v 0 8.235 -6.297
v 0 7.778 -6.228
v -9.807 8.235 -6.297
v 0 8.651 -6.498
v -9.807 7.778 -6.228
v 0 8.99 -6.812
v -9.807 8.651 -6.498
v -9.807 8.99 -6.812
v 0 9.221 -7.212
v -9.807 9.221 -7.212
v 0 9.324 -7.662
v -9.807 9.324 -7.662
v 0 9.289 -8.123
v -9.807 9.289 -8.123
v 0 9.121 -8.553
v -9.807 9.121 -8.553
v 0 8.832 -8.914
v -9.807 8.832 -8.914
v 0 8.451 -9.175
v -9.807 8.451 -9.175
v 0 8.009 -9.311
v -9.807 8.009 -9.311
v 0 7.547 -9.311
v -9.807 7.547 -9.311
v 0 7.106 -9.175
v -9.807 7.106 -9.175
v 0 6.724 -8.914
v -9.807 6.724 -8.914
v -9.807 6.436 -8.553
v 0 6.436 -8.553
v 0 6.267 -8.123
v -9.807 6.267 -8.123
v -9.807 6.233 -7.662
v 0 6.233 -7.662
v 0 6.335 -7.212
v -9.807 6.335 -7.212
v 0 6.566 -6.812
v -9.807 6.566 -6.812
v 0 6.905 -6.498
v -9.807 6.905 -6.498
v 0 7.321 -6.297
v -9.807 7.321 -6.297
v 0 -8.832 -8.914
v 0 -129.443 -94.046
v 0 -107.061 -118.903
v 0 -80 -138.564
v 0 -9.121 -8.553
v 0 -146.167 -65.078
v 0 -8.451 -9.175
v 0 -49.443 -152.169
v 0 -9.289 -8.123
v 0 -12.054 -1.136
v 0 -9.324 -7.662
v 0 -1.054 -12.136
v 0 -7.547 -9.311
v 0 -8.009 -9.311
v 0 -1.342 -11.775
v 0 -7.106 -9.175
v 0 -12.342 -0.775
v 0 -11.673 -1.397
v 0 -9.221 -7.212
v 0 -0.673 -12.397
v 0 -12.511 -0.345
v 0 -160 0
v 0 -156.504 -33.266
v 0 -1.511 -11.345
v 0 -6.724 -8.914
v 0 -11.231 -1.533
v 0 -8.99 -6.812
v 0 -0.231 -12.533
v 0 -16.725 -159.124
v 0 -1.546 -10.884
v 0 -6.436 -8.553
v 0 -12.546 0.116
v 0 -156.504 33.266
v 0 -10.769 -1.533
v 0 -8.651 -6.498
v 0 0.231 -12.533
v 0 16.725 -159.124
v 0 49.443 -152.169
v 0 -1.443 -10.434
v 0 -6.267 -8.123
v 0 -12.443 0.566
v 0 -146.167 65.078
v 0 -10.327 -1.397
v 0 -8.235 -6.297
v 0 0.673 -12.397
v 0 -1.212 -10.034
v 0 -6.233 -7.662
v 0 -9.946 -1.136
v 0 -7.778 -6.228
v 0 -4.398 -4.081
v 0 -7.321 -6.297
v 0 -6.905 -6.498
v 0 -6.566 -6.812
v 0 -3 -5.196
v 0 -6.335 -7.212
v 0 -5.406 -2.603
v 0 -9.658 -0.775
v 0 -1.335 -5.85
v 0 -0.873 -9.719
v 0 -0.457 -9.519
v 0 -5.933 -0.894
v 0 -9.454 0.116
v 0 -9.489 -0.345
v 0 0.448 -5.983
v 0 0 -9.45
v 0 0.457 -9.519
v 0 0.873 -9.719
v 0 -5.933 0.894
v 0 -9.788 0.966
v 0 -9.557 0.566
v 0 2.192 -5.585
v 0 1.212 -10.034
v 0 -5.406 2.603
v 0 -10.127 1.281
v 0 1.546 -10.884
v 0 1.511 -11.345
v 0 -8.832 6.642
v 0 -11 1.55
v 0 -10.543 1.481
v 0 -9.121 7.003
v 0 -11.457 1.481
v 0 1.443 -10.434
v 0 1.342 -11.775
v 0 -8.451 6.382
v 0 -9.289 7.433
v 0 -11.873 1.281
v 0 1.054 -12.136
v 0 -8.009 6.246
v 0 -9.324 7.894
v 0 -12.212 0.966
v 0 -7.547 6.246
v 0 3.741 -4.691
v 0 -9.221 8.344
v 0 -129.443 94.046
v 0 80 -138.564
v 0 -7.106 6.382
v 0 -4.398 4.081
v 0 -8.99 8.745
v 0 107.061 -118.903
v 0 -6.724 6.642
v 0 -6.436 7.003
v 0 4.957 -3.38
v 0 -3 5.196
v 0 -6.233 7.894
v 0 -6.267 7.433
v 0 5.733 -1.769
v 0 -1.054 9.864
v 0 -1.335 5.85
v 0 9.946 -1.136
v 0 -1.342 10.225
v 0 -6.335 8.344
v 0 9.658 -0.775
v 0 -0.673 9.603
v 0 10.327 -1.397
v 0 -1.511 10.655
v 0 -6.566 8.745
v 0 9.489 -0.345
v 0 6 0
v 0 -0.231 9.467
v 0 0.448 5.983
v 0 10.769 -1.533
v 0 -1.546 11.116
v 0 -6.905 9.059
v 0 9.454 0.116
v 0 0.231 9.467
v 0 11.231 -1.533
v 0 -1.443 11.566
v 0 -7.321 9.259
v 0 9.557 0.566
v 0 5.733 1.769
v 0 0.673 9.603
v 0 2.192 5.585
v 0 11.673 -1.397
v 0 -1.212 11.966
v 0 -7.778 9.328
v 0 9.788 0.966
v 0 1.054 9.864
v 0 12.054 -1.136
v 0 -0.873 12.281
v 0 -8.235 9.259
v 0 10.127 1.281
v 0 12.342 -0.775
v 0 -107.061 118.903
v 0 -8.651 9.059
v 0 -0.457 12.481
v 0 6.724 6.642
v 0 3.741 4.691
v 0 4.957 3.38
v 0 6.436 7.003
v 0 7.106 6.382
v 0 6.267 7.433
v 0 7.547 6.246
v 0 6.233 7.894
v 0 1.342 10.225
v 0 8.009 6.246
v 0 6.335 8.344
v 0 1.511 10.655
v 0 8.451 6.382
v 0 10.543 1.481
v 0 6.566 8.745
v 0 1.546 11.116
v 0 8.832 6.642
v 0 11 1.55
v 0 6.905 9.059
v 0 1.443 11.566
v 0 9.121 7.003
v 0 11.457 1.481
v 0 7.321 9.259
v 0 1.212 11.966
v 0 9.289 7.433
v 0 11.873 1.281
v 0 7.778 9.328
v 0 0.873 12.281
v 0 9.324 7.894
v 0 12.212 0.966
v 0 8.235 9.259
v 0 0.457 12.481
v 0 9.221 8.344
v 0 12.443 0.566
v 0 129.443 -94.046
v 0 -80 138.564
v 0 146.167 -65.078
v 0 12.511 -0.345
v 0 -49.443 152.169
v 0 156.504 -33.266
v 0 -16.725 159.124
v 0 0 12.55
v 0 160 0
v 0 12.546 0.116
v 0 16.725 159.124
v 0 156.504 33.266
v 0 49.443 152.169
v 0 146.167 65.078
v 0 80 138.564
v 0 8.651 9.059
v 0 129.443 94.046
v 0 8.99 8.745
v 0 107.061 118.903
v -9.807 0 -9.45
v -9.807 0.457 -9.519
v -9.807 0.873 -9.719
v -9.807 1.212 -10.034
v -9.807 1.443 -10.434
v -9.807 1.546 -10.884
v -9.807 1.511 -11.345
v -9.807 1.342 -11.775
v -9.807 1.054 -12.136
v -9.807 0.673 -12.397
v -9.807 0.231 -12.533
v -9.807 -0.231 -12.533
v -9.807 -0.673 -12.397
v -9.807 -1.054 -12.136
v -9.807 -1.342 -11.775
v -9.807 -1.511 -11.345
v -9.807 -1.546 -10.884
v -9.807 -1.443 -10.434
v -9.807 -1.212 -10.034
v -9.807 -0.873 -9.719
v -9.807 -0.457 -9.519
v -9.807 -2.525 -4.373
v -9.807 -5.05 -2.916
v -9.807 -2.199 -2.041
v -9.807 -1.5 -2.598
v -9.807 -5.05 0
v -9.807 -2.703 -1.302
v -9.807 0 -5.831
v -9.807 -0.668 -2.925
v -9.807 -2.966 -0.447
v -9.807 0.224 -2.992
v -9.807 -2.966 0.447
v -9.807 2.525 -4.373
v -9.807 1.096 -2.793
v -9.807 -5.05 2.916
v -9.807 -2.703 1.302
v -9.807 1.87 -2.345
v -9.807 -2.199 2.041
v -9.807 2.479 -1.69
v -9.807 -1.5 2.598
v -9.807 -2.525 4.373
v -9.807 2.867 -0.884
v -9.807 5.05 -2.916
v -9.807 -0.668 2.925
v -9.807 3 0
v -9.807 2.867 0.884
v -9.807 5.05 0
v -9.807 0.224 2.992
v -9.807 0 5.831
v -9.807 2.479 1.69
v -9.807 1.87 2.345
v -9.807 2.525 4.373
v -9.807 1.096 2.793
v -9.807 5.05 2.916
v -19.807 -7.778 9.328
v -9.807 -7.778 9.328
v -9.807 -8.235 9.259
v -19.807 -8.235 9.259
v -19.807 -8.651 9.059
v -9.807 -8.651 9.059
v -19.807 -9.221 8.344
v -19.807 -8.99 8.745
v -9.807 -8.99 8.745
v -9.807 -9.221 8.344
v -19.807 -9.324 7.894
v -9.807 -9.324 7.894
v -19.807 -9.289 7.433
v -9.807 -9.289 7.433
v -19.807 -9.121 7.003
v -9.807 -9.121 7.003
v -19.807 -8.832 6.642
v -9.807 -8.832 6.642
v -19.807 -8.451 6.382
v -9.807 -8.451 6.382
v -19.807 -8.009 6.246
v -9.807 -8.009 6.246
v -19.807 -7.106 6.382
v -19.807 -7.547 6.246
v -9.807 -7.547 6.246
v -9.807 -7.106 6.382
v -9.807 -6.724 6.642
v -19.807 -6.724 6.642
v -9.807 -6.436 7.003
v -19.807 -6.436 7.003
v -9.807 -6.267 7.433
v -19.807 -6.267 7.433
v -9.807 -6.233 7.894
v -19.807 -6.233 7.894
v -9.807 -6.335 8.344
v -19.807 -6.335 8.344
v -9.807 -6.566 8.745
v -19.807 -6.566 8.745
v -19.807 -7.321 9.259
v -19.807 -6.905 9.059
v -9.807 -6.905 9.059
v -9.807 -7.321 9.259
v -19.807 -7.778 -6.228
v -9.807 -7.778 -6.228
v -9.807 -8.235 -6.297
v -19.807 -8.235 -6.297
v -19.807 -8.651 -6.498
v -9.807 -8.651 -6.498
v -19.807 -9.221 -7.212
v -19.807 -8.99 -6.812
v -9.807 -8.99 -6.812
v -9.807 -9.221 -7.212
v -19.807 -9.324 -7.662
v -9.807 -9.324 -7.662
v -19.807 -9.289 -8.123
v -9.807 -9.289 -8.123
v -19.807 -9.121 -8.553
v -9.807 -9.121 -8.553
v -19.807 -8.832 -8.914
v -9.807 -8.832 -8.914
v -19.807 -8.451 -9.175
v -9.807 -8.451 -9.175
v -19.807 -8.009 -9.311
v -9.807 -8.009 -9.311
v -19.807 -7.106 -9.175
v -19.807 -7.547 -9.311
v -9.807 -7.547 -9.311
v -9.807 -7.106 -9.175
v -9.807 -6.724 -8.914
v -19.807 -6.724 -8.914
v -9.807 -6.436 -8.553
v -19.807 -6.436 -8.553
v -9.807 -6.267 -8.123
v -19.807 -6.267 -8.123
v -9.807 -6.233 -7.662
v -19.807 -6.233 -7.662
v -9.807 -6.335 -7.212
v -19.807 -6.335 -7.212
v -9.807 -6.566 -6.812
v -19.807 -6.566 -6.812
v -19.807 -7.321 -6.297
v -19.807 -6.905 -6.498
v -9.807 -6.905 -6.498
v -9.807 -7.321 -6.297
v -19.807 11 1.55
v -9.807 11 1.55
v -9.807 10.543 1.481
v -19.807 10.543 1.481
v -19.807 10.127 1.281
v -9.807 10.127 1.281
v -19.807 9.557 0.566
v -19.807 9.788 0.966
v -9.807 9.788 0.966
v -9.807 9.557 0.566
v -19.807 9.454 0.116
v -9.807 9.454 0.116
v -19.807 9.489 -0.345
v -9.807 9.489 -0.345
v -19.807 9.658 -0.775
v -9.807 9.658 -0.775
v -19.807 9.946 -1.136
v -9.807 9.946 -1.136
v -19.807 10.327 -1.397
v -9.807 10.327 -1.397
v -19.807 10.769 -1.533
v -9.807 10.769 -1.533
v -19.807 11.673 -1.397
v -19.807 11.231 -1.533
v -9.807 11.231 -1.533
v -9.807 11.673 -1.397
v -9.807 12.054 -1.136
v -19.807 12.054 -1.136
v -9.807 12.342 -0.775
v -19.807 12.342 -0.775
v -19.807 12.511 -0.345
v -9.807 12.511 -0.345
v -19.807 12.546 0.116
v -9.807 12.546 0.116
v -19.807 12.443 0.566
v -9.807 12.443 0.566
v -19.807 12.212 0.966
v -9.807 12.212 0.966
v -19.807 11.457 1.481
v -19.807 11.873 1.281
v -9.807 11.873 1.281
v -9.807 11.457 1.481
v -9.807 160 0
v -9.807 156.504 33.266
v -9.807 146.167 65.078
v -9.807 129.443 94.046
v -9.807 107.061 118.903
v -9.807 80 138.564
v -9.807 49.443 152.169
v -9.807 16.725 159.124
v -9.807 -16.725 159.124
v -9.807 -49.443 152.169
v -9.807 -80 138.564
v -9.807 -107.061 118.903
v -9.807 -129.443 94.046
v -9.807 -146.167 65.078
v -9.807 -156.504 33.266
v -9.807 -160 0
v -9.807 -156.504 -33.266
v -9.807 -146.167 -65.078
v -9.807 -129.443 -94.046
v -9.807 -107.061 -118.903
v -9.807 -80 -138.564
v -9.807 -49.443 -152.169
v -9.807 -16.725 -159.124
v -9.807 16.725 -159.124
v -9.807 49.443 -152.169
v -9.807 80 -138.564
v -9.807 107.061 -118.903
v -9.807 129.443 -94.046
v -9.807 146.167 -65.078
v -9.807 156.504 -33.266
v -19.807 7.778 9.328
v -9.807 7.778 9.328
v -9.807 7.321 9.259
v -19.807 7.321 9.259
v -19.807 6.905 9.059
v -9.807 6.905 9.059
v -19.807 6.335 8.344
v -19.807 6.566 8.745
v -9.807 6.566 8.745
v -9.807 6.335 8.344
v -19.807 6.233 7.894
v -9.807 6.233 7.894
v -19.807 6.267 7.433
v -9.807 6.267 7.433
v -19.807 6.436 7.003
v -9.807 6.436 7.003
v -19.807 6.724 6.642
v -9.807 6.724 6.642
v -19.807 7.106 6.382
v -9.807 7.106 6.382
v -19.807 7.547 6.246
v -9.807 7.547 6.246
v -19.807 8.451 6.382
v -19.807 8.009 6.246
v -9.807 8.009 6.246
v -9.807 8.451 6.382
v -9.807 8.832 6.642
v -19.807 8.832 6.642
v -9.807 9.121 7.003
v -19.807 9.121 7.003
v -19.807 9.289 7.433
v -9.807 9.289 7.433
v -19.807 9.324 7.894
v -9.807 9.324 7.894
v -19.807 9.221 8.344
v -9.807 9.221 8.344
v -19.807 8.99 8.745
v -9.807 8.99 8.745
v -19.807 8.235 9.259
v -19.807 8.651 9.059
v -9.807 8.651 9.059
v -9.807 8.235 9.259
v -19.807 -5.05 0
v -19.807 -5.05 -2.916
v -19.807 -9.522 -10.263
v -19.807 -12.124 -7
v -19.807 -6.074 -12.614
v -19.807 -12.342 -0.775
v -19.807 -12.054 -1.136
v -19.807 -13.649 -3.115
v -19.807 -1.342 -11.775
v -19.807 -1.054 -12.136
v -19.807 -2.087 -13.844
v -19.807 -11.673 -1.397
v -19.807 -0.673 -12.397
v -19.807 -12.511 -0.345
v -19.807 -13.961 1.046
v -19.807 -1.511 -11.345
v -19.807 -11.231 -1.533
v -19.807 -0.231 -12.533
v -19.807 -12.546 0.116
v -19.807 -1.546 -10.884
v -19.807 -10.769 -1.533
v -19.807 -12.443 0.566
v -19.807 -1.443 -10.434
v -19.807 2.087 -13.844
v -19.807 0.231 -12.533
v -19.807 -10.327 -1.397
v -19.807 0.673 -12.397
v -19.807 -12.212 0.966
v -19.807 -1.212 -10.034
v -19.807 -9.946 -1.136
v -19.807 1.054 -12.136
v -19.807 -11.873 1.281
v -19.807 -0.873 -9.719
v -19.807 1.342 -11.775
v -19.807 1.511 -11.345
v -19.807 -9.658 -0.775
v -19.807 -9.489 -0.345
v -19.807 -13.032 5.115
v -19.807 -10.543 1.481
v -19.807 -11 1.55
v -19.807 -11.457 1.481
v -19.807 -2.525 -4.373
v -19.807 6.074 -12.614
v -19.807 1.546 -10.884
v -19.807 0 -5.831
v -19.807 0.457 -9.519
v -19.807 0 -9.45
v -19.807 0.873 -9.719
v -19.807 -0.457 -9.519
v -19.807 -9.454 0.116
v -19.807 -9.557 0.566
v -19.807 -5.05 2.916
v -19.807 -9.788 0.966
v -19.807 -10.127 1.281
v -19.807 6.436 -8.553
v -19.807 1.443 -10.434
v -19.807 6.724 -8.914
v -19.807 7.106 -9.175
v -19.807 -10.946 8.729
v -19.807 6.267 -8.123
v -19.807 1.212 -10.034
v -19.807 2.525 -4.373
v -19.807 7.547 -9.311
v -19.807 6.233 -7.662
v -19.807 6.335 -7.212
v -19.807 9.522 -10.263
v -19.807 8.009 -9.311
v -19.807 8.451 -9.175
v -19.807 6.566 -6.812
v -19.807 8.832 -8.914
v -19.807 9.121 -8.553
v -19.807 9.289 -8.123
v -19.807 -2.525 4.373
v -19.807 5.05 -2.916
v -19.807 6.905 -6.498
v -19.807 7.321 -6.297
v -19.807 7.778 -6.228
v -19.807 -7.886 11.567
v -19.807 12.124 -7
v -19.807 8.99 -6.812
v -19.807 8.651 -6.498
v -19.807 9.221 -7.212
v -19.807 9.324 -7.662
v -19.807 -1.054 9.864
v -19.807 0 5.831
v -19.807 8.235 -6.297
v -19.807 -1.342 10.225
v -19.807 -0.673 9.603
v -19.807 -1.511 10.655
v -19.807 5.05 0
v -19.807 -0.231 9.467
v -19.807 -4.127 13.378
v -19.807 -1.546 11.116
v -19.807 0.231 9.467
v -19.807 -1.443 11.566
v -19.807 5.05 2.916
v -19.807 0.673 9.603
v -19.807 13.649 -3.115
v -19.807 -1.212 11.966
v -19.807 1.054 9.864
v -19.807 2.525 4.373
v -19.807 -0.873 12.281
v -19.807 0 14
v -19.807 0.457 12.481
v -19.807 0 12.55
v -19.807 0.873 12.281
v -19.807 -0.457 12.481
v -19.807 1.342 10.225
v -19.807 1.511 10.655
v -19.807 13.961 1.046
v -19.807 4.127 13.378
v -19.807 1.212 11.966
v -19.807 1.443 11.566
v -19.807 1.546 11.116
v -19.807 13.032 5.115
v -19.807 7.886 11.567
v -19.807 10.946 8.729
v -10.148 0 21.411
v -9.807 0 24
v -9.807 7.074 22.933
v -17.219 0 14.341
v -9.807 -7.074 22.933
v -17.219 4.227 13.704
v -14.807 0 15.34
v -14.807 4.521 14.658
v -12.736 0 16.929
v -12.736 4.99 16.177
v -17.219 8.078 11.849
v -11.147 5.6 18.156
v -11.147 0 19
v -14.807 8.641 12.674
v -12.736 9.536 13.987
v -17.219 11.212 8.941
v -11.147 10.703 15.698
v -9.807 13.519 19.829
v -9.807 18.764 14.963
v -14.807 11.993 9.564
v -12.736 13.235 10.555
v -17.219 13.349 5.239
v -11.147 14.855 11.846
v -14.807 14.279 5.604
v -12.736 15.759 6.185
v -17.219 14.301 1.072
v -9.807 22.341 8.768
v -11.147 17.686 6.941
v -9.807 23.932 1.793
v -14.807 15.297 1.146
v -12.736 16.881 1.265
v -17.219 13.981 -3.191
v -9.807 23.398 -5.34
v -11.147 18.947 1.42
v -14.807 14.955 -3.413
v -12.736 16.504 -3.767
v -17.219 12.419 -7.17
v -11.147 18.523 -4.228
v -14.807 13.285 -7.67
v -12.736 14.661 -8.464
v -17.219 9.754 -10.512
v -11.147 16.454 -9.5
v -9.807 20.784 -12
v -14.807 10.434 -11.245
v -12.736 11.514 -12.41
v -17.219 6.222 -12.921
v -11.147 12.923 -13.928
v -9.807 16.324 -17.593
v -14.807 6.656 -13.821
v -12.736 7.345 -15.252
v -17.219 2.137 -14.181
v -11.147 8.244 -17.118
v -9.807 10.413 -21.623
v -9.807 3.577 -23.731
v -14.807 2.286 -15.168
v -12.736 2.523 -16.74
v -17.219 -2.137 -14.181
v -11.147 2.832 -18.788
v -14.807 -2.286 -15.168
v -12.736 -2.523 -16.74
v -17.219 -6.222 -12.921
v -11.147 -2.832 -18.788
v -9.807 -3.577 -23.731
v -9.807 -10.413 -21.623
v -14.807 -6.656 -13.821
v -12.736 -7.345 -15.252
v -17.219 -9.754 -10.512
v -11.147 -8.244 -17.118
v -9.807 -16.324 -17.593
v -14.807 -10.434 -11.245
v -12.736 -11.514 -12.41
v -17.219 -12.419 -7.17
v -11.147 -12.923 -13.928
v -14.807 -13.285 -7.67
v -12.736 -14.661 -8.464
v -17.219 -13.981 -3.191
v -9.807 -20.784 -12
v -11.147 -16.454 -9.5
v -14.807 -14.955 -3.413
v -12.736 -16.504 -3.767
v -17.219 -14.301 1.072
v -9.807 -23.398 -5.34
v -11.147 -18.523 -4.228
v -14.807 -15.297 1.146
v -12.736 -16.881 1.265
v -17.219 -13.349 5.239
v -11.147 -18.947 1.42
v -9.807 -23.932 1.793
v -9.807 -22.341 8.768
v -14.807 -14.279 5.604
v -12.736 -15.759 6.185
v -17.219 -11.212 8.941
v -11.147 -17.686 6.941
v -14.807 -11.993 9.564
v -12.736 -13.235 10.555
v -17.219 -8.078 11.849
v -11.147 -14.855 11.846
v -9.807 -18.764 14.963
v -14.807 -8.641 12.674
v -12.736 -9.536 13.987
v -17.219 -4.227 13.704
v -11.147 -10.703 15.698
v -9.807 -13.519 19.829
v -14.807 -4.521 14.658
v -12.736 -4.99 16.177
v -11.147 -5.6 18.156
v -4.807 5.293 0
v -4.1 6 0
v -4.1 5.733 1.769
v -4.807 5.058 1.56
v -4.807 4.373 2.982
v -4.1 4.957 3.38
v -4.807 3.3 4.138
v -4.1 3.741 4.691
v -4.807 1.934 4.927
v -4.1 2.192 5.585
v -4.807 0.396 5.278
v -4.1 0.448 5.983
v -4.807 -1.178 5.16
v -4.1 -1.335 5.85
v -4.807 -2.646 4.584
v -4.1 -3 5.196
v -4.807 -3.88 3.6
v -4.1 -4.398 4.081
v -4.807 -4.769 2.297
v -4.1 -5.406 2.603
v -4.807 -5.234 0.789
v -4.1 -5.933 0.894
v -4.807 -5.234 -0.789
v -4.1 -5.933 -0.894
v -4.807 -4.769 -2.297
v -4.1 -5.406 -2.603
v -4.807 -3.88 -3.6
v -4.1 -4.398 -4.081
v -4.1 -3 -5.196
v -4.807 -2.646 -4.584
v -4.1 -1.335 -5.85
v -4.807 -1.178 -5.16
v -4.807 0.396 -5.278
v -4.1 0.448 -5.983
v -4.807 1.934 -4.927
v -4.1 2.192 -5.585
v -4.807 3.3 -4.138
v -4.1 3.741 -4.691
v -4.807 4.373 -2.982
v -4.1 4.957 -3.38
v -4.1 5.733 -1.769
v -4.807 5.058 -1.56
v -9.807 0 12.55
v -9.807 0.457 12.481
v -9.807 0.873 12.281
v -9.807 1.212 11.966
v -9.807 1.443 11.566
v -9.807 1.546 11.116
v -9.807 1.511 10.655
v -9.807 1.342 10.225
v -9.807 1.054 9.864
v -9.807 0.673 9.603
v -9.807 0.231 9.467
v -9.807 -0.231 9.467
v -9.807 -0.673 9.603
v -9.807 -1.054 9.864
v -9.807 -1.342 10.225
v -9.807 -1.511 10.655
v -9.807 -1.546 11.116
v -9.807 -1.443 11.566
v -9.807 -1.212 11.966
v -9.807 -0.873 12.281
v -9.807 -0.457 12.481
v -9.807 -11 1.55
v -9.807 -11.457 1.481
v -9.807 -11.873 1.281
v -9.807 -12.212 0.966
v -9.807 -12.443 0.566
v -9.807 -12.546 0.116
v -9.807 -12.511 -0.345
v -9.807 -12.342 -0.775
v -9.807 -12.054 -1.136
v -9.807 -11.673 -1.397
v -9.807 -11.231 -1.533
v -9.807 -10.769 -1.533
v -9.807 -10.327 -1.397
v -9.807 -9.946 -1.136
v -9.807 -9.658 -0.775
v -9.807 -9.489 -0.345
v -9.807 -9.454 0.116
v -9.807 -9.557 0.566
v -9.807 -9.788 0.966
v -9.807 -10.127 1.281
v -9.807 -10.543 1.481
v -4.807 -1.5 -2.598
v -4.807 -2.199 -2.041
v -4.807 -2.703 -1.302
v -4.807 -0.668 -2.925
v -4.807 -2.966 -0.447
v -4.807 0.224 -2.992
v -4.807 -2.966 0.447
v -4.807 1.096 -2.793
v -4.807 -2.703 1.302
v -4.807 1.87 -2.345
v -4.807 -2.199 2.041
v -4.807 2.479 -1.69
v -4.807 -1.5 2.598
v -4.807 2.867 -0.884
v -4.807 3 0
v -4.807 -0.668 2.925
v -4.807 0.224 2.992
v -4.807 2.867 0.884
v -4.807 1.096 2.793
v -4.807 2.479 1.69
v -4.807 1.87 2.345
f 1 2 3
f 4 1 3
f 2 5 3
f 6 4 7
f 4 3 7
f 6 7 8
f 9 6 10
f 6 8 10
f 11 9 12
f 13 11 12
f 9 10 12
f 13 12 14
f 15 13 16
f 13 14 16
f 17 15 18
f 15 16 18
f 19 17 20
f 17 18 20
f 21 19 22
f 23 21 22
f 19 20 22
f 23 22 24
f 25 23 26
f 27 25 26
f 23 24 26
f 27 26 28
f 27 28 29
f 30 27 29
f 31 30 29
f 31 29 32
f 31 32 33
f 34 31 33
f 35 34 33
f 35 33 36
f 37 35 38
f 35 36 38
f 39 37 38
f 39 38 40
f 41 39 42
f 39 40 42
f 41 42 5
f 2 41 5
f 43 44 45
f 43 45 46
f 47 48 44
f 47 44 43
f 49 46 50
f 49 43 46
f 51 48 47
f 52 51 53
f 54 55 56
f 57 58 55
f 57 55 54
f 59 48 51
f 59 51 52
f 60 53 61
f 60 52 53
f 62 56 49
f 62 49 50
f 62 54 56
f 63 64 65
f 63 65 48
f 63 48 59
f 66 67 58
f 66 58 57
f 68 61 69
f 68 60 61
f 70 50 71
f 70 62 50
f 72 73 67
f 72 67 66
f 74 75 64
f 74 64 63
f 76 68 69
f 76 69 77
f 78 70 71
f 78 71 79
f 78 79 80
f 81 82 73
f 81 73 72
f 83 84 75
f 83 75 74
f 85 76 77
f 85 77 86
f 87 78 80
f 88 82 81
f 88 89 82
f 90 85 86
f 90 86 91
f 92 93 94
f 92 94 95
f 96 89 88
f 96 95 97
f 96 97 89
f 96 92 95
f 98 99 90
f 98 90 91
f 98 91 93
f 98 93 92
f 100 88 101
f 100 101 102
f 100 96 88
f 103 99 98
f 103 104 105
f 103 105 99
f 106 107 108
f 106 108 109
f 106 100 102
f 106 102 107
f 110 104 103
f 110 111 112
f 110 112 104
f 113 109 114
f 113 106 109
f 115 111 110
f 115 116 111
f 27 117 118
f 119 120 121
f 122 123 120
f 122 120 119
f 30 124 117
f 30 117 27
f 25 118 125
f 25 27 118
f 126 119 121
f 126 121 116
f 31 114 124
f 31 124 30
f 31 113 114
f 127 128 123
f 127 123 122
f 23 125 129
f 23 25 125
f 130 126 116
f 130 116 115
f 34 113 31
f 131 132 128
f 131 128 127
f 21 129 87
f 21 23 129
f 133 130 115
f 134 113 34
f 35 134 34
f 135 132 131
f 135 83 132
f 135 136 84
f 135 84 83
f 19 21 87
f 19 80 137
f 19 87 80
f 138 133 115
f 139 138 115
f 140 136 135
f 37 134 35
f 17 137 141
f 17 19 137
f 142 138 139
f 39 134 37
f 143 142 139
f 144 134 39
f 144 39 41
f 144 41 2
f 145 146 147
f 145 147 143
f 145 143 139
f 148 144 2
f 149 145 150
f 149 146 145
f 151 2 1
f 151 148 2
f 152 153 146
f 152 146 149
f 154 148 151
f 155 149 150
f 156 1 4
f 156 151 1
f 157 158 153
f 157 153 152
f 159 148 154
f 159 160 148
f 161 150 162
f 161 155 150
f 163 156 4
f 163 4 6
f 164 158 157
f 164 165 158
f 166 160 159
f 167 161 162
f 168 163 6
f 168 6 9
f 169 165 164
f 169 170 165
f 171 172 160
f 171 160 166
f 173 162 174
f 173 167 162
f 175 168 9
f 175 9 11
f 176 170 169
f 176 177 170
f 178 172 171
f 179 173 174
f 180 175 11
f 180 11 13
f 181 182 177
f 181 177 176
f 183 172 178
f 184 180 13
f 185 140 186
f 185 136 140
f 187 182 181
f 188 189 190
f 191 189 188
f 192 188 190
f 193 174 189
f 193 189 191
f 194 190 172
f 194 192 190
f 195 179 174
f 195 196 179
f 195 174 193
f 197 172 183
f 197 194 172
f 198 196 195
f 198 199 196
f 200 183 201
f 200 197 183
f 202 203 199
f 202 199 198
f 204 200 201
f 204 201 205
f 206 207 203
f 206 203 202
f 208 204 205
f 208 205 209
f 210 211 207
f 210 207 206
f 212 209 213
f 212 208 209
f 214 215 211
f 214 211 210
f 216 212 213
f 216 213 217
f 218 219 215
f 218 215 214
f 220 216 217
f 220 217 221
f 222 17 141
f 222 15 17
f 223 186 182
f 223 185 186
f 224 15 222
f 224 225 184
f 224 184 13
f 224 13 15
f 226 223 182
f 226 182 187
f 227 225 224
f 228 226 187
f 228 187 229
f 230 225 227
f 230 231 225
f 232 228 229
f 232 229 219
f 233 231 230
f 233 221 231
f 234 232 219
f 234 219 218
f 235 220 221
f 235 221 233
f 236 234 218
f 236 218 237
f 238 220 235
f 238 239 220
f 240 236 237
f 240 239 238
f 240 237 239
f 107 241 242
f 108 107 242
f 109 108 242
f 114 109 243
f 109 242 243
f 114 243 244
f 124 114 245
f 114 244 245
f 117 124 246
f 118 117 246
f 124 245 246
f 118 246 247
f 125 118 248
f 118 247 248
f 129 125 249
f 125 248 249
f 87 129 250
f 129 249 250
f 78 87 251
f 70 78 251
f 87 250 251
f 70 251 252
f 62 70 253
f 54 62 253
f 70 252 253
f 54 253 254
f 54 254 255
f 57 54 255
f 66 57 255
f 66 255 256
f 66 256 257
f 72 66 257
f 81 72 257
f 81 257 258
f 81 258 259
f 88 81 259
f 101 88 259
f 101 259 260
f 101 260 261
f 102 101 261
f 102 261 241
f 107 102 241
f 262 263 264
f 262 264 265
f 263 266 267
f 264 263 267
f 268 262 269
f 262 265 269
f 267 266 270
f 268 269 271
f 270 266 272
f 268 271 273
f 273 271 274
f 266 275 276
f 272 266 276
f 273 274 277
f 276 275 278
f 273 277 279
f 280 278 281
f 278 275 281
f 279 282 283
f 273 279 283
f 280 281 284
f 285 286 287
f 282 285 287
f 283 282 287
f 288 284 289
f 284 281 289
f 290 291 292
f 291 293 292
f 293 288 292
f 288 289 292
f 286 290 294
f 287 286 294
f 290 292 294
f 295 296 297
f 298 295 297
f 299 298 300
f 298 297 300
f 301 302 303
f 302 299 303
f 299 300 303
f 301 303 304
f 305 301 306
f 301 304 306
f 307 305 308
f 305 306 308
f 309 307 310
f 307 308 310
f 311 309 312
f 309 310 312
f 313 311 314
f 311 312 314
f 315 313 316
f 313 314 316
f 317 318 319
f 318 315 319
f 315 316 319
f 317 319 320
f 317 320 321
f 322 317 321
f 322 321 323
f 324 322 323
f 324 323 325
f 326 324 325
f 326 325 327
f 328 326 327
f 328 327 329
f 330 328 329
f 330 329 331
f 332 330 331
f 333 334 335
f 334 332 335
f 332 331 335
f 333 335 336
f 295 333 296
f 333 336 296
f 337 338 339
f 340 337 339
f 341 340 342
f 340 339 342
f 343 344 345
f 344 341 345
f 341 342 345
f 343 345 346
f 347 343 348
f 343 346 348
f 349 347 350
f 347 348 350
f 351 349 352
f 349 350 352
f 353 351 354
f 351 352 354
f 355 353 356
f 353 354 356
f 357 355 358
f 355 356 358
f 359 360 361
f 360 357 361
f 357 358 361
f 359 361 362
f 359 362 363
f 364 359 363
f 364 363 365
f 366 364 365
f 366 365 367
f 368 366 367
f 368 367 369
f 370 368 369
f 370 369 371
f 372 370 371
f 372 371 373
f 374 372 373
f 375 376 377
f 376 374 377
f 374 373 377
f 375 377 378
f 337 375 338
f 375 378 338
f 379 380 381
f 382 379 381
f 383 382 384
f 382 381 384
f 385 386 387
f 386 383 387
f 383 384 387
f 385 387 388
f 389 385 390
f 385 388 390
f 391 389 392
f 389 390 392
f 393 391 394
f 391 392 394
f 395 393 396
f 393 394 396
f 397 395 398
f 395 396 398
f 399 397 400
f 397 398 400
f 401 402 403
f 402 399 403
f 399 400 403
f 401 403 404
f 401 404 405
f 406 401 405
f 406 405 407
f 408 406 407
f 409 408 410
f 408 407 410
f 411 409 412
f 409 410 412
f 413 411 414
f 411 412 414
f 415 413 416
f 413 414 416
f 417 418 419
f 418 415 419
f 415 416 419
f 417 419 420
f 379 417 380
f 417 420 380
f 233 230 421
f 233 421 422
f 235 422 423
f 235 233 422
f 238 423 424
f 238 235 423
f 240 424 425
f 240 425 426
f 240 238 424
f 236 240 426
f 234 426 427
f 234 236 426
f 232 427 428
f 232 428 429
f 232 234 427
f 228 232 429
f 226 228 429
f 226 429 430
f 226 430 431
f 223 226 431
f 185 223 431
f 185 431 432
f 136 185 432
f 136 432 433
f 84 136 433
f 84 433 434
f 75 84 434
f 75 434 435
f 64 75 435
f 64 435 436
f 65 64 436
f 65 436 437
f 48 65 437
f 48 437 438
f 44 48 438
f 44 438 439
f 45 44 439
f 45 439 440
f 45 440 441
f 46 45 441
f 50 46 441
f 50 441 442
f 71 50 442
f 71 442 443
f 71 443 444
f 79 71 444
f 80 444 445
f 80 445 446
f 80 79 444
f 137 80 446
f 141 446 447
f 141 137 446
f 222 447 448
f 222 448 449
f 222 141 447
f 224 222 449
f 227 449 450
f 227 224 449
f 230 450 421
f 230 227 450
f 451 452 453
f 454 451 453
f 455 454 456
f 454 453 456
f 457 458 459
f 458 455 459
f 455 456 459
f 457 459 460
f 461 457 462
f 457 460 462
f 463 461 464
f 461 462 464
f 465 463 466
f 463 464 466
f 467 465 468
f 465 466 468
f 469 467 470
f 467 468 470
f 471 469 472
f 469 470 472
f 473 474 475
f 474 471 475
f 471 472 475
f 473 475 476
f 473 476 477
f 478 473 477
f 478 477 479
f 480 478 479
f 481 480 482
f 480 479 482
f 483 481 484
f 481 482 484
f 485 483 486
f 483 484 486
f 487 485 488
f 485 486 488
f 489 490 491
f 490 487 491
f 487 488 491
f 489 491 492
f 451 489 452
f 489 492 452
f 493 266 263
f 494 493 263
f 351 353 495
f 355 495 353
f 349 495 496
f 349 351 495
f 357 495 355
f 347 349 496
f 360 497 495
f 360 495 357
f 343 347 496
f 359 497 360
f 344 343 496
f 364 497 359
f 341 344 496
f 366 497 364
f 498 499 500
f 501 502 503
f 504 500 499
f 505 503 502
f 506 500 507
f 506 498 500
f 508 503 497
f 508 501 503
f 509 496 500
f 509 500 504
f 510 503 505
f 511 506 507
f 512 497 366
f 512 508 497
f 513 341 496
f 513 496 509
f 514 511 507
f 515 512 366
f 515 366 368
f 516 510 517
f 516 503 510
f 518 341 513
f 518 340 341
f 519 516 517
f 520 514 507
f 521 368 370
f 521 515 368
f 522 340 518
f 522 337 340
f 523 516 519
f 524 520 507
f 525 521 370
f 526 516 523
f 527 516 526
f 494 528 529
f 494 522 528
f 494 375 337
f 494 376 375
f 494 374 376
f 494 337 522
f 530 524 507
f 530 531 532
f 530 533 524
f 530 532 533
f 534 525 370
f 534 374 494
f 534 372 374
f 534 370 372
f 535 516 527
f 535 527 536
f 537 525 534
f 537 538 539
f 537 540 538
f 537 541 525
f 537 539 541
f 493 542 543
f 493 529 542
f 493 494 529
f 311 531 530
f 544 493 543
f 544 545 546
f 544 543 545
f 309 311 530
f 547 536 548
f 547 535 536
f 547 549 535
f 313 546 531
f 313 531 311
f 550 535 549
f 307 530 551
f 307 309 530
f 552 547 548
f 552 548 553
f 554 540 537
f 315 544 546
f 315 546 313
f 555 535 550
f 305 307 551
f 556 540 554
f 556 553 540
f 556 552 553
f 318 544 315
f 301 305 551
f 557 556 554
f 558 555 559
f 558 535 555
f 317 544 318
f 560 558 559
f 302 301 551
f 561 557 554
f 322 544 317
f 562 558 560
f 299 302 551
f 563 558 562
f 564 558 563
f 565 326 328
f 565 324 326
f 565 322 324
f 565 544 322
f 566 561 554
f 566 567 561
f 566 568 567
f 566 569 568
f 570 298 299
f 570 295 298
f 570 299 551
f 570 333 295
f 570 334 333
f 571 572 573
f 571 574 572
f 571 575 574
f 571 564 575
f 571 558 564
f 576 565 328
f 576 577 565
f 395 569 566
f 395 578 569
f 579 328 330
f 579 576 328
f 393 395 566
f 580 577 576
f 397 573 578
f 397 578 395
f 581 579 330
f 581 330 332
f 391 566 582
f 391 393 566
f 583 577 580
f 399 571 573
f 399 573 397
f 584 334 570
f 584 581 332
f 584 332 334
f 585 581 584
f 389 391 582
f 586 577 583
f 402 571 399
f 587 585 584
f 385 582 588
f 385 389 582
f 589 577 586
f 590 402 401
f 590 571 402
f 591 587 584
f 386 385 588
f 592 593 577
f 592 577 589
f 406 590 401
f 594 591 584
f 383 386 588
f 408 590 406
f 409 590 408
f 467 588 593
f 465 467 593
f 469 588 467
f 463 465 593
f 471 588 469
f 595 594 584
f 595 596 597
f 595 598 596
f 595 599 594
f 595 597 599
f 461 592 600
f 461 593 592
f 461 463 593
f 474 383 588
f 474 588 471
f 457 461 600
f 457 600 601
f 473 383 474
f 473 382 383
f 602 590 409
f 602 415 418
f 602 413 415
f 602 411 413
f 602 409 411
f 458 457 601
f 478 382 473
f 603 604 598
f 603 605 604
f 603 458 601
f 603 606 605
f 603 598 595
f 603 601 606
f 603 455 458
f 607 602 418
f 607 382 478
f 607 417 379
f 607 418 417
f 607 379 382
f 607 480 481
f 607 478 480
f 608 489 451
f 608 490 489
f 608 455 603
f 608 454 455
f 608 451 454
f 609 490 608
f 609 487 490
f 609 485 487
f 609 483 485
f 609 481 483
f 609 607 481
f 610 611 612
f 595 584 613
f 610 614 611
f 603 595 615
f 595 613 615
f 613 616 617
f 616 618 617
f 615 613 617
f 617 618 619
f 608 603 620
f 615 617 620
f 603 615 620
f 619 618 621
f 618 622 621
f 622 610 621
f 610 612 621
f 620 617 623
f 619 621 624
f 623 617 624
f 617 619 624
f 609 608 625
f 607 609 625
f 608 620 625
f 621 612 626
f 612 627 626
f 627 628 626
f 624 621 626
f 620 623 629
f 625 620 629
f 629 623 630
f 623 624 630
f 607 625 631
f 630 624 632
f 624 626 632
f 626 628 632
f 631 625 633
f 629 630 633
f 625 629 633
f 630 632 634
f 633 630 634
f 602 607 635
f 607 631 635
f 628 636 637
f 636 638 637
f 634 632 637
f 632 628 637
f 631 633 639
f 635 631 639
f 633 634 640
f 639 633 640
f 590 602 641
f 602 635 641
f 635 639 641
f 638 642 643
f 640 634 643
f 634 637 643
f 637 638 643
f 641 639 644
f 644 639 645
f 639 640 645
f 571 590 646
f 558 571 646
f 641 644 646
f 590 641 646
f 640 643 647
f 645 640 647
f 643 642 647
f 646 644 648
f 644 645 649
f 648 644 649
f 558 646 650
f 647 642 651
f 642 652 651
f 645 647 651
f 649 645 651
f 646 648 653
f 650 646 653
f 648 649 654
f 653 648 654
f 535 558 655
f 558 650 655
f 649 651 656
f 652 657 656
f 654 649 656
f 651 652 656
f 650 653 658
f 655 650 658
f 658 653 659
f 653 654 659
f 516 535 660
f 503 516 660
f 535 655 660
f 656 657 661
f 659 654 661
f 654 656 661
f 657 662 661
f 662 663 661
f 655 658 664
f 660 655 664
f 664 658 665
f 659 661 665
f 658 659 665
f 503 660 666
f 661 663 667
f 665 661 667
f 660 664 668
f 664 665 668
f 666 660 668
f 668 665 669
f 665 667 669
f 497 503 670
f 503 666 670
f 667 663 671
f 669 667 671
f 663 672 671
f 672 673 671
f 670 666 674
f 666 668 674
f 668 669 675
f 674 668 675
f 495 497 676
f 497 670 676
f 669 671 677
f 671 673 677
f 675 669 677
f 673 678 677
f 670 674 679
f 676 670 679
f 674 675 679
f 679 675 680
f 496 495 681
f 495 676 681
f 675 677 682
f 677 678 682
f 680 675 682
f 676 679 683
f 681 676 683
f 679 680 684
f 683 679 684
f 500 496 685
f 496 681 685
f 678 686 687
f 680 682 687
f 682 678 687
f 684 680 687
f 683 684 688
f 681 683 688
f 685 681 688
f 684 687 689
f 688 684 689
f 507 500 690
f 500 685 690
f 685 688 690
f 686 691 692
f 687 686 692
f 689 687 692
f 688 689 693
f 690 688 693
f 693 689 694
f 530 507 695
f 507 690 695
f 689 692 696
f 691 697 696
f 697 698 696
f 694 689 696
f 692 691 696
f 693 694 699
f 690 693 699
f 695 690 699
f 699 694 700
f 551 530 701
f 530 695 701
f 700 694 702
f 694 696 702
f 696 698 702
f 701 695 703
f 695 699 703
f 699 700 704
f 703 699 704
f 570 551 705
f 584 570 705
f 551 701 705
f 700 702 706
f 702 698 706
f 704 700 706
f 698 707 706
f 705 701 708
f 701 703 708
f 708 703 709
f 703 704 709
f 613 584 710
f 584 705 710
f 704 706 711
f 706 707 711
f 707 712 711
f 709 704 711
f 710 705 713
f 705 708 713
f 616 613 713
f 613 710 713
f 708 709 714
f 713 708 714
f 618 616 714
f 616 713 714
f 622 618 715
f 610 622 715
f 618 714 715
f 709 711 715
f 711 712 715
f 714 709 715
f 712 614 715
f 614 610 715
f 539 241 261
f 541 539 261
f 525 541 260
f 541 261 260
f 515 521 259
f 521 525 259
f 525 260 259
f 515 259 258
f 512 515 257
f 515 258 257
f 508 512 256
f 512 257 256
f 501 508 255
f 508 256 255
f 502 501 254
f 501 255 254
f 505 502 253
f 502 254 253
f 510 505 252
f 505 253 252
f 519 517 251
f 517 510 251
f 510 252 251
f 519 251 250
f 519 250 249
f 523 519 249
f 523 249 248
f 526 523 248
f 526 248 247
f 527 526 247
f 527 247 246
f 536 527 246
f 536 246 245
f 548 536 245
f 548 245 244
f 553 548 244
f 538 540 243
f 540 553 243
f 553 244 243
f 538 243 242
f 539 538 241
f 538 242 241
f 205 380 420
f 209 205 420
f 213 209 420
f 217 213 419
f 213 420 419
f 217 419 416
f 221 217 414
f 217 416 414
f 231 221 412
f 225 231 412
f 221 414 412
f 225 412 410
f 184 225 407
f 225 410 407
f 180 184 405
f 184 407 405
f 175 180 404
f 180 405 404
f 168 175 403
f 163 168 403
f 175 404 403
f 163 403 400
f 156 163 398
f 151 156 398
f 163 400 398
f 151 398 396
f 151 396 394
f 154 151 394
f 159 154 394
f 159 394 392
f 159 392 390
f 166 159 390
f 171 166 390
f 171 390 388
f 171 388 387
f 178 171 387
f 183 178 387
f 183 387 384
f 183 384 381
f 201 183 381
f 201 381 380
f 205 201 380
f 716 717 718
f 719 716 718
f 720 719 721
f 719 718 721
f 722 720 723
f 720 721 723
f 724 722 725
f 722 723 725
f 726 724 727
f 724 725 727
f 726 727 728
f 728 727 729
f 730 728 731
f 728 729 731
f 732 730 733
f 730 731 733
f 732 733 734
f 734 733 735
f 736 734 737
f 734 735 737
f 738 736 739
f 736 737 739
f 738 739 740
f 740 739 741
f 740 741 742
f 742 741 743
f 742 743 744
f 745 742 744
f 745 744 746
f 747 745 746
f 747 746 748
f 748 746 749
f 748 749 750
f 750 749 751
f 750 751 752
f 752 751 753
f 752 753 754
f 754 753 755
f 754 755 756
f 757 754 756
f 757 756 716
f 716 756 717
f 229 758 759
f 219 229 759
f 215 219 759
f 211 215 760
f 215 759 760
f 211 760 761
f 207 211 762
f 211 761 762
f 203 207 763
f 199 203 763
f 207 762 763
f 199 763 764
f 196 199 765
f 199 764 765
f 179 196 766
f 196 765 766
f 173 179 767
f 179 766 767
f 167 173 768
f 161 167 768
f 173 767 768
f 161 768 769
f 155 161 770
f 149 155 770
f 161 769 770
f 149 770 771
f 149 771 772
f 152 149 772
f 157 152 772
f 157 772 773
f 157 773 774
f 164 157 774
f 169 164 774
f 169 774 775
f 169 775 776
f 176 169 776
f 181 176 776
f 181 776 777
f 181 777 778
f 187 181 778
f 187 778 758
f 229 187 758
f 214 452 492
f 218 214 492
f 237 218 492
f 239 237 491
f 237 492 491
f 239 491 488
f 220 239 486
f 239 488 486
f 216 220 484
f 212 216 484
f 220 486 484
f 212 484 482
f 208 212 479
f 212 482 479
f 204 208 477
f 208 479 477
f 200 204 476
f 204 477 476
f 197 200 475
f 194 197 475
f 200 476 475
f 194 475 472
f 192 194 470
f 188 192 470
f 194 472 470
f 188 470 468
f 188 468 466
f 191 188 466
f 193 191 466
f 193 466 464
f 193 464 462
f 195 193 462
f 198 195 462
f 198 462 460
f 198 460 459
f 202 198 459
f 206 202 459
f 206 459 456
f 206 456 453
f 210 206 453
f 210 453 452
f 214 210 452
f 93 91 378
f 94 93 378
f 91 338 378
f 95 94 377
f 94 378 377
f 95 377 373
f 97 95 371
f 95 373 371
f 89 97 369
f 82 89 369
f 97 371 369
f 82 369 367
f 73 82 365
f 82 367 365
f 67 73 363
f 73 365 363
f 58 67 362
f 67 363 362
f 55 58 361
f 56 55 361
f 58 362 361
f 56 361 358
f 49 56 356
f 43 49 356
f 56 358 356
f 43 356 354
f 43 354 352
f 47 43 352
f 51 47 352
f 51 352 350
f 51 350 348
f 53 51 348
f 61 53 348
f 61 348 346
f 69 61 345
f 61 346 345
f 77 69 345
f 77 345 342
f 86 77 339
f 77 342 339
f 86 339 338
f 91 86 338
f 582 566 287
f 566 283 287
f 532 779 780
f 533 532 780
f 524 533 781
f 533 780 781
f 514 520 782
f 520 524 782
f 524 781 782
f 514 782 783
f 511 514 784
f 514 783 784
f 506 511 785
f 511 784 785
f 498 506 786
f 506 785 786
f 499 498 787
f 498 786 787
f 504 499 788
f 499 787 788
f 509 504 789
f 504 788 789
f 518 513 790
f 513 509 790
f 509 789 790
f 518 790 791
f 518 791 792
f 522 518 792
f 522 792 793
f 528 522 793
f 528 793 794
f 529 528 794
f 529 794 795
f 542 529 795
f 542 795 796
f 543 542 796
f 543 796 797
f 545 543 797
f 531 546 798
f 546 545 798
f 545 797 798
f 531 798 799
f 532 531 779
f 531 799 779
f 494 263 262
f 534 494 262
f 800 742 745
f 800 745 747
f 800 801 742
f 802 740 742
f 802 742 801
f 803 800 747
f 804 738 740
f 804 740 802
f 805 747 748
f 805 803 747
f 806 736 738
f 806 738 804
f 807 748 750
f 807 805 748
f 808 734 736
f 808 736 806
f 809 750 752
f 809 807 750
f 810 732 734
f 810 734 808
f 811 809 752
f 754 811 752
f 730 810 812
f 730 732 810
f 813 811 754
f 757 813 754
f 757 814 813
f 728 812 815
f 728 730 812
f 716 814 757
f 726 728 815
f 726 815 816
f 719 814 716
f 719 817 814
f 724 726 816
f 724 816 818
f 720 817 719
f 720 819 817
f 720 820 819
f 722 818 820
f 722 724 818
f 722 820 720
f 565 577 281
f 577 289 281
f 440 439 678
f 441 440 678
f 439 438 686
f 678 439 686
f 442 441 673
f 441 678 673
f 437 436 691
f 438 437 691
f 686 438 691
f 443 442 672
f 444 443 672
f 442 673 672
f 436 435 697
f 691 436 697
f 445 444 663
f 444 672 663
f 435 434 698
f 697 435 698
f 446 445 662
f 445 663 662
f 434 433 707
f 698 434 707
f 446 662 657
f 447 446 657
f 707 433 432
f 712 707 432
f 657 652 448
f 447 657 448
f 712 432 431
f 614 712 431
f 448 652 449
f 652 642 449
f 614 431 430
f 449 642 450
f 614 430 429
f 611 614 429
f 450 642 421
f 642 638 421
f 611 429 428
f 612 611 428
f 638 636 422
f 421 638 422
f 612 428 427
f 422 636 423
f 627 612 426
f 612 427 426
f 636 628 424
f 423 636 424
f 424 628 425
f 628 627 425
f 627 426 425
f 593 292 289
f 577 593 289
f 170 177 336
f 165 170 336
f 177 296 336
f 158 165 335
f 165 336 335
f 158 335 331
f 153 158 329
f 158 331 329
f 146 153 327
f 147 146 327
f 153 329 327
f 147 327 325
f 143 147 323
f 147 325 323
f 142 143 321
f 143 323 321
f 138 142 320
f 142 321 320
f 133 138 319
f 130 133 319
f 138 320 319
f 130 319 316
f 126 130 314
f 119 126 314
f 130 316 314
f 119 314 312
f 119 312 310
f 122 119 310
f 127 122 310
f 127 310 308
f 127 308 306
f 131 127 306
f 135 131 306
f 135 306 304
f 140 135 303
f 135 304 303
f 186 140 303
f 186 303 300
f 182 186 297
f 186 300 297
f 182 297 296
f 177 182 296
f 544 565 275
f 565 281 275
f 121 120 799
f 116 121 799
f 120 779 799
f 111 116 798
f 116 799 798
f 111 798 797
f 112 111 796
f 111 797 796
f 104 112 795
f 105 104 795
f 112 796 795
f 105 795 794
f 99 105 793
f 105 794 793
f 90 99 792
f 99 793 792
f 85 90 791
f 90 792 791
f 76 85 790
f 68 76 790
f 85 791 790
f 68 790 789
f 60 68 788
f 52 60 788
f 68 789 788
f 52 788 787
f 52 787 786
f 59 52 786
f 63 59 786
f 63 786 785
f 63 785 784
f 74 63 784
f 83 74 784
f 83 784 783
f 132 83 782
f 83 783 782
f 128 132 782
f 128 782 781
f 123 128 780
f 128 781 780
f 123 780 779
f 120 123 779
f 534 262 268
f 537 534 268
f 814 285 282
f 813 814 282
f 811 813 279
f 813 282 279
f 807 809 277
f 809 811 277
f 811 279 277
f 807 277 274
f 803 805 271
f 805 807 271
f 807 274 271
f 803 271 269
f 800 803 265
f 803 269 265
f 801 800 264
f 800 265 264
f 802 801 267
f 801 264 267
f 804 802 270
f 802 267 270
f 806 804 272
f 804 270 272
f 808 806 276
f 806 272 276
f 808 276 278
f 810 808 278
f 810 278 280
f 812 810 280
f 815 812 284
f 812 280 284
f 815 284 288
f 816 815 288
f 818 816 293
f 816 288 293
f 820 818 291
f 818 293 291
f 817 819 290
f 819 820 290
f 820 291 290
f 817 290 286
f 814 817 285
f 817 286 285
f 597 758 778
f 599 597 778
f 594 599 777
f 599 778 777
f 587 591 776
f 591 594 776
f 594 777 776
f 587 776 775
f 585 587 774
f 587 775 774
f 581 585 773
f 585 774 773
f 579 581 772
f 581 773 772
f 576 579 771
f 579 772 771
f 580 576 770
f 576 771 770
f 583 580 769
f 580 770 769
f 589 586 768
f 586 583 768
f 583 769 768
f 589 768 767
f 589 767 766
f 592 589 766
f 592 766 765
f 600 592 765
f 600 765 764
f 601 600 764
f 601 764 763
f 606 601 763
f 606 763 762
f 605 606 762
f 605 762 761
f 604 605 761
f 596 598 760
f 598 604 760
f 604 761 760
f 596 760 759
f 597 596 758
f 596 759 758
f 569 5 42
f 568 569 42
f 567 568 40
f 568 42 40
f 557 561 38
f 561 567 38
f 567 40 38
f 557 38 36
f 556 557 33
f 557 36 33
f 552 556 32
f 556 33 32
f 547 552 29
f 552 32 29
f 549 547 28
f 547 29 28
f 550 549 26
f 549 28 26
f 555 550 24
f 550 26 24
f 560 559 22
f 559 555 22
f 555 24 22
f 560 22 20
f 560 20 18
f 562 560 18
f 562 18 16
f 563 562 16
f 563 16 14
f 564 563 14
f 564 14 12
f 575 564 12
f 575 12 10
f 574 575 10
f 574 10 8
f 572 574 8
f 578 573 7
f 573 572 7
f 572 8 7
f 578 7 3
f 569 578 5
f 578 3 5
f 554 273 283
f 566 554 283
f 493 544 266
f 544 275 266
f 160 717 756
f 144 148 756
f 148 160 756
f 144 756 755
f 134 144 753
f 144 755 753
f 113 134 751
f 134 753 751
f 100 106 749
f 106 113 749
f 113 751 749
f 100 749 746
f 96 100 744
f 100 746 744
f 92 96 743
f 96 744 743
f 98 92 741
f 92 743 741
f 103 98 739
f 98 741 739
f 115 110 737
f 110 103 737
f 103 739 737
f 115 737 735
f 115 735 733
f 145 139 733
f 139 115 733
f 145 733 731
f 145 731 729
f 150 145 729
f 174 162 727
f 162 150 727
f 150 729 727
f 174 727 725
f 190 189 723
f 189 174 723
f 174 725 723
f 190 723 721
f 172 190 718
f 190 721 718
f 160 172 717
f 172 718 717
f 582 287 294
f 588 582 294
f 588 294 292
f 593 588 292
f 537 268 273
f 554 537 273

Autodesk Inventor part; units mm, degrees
ref_plane "YZ Plane" through (0, 0, 0) normal (1, 0, 0) x (0, 1, 0)
ref_plane "XZ Plane" through (0, 0, 0) normal (0, 1, 0) x (-1, 0, 0)
ref_plane "XY Plane" through (0, 0, 0) normal (0, 0, 1) x (1, 0, 0)
sketch "Szkic1" plane through (0, 0, 0) normal (0, 0, 1) x (1, 0, 0)
  line L0 (-41.2071, 0) -> (178.5929, 0) projected
  line L1 (0, -47.06) -> (0, 194.51) projected
  line L2 (0, 0) -> (0, 6) construction
  line L3 (0, 6) -> (-4.1, 6)
  line L4 (-4.1, 6) -> (-4.8071, 5.2929)
  line L5 (-4.1, 6) -> (-3.1, 6) construction
  line L6 (0, 0) -> (-4.8071, 0) construction
  line L7 (-4.8071, 0) -> (-4.8071, 3) construction
  line L8 (-4.8071, 3) -> (-4.8071, 5.2929)
  line L9 (-4.8071, 3) -> (-9.8071, 3)
  line L10 (-9.8071, 3) -> (-9.8071, 160)
  line L11 (-9.8071, 3) -> (147.1929, 3) construction
  line L12 (-9.8071, 160) -> (0, 160)
  line L13 (0, 160) -> (0, 6)
  dimension "d0" = 6
  dimension "d1" = 4.1
  dimension "d5" = 1
  dimension "d6" = 135
  dimension "d7" = 3
  dimension "d8" = 5
  dimension "d9" = 157
  dimension "d10" = 90
revolve "Obrót1" add sketch "Szkic1" angle 360 about axis through (-10, 0, 0) along (1, 0, 0)
sketch "Szkic2" plane through (-9.8071, 0, 0) normal (-1, 0, 0) x (0, 0, 1)
  line L0 (0, 0) -> (11, 0) construction
  circle A0 centre (11, 0) radius 1.55
  circle A1 centre (7.7782, 7.7782) radius 1.55
  circle A2 centre (0, 11) radius 1.55
  circle A3 centre (-7.7782, 7.7782) radius 1.55
  circle A4 centre (-11, 0) radius 1.55
  circle A5 centre (-7.7782, -7.7782) radius 1.55
  circle A6 centre (0, -11) radius 1.55
  circle A7 centre (7.7782, -7.7782) radius 1.55
  circle A8 centre (0, 0) radius 14
  circle A9 centre (0, 0) radius 5.05
  line L1 (5.8312, 0) -> (2.9156, -5.05)
  line L2 (2.9156, 5.05) -> (5.8312, 0)
  line L3 (-2.9156, 5.05) -> (2.9156, 5.05)
  line L4 (-5.8312, 0) -> (-2.9156, 5.05)
  line L5 (-2.9156, -5.05) -> (-5.8312, 0)
  line L6 (2.9156, -5.05) -> (-2.9156, -5.05)
  point P0 (0, -5.05)
  dimension "d21" = 10.1
  dimension "d12" = 11
  dimension "d13" = 3.1
  dimension "d16" = 360
  dimension "d20" = 28
  dimension "d26" = 360
extrude "Wyciągnięcie proste1" cut sketch "Szkic2" against normal through all contours A0 | A1 | A2 | A3 | A4 | A5 | A6 | A7
extrude "Wyciągnięcie proste2" add sketch "Szkic2" along normal blind 10
fillet "Zaokrąglenie1" radius 10 1 edges at (-9.8071, 0, -14)
